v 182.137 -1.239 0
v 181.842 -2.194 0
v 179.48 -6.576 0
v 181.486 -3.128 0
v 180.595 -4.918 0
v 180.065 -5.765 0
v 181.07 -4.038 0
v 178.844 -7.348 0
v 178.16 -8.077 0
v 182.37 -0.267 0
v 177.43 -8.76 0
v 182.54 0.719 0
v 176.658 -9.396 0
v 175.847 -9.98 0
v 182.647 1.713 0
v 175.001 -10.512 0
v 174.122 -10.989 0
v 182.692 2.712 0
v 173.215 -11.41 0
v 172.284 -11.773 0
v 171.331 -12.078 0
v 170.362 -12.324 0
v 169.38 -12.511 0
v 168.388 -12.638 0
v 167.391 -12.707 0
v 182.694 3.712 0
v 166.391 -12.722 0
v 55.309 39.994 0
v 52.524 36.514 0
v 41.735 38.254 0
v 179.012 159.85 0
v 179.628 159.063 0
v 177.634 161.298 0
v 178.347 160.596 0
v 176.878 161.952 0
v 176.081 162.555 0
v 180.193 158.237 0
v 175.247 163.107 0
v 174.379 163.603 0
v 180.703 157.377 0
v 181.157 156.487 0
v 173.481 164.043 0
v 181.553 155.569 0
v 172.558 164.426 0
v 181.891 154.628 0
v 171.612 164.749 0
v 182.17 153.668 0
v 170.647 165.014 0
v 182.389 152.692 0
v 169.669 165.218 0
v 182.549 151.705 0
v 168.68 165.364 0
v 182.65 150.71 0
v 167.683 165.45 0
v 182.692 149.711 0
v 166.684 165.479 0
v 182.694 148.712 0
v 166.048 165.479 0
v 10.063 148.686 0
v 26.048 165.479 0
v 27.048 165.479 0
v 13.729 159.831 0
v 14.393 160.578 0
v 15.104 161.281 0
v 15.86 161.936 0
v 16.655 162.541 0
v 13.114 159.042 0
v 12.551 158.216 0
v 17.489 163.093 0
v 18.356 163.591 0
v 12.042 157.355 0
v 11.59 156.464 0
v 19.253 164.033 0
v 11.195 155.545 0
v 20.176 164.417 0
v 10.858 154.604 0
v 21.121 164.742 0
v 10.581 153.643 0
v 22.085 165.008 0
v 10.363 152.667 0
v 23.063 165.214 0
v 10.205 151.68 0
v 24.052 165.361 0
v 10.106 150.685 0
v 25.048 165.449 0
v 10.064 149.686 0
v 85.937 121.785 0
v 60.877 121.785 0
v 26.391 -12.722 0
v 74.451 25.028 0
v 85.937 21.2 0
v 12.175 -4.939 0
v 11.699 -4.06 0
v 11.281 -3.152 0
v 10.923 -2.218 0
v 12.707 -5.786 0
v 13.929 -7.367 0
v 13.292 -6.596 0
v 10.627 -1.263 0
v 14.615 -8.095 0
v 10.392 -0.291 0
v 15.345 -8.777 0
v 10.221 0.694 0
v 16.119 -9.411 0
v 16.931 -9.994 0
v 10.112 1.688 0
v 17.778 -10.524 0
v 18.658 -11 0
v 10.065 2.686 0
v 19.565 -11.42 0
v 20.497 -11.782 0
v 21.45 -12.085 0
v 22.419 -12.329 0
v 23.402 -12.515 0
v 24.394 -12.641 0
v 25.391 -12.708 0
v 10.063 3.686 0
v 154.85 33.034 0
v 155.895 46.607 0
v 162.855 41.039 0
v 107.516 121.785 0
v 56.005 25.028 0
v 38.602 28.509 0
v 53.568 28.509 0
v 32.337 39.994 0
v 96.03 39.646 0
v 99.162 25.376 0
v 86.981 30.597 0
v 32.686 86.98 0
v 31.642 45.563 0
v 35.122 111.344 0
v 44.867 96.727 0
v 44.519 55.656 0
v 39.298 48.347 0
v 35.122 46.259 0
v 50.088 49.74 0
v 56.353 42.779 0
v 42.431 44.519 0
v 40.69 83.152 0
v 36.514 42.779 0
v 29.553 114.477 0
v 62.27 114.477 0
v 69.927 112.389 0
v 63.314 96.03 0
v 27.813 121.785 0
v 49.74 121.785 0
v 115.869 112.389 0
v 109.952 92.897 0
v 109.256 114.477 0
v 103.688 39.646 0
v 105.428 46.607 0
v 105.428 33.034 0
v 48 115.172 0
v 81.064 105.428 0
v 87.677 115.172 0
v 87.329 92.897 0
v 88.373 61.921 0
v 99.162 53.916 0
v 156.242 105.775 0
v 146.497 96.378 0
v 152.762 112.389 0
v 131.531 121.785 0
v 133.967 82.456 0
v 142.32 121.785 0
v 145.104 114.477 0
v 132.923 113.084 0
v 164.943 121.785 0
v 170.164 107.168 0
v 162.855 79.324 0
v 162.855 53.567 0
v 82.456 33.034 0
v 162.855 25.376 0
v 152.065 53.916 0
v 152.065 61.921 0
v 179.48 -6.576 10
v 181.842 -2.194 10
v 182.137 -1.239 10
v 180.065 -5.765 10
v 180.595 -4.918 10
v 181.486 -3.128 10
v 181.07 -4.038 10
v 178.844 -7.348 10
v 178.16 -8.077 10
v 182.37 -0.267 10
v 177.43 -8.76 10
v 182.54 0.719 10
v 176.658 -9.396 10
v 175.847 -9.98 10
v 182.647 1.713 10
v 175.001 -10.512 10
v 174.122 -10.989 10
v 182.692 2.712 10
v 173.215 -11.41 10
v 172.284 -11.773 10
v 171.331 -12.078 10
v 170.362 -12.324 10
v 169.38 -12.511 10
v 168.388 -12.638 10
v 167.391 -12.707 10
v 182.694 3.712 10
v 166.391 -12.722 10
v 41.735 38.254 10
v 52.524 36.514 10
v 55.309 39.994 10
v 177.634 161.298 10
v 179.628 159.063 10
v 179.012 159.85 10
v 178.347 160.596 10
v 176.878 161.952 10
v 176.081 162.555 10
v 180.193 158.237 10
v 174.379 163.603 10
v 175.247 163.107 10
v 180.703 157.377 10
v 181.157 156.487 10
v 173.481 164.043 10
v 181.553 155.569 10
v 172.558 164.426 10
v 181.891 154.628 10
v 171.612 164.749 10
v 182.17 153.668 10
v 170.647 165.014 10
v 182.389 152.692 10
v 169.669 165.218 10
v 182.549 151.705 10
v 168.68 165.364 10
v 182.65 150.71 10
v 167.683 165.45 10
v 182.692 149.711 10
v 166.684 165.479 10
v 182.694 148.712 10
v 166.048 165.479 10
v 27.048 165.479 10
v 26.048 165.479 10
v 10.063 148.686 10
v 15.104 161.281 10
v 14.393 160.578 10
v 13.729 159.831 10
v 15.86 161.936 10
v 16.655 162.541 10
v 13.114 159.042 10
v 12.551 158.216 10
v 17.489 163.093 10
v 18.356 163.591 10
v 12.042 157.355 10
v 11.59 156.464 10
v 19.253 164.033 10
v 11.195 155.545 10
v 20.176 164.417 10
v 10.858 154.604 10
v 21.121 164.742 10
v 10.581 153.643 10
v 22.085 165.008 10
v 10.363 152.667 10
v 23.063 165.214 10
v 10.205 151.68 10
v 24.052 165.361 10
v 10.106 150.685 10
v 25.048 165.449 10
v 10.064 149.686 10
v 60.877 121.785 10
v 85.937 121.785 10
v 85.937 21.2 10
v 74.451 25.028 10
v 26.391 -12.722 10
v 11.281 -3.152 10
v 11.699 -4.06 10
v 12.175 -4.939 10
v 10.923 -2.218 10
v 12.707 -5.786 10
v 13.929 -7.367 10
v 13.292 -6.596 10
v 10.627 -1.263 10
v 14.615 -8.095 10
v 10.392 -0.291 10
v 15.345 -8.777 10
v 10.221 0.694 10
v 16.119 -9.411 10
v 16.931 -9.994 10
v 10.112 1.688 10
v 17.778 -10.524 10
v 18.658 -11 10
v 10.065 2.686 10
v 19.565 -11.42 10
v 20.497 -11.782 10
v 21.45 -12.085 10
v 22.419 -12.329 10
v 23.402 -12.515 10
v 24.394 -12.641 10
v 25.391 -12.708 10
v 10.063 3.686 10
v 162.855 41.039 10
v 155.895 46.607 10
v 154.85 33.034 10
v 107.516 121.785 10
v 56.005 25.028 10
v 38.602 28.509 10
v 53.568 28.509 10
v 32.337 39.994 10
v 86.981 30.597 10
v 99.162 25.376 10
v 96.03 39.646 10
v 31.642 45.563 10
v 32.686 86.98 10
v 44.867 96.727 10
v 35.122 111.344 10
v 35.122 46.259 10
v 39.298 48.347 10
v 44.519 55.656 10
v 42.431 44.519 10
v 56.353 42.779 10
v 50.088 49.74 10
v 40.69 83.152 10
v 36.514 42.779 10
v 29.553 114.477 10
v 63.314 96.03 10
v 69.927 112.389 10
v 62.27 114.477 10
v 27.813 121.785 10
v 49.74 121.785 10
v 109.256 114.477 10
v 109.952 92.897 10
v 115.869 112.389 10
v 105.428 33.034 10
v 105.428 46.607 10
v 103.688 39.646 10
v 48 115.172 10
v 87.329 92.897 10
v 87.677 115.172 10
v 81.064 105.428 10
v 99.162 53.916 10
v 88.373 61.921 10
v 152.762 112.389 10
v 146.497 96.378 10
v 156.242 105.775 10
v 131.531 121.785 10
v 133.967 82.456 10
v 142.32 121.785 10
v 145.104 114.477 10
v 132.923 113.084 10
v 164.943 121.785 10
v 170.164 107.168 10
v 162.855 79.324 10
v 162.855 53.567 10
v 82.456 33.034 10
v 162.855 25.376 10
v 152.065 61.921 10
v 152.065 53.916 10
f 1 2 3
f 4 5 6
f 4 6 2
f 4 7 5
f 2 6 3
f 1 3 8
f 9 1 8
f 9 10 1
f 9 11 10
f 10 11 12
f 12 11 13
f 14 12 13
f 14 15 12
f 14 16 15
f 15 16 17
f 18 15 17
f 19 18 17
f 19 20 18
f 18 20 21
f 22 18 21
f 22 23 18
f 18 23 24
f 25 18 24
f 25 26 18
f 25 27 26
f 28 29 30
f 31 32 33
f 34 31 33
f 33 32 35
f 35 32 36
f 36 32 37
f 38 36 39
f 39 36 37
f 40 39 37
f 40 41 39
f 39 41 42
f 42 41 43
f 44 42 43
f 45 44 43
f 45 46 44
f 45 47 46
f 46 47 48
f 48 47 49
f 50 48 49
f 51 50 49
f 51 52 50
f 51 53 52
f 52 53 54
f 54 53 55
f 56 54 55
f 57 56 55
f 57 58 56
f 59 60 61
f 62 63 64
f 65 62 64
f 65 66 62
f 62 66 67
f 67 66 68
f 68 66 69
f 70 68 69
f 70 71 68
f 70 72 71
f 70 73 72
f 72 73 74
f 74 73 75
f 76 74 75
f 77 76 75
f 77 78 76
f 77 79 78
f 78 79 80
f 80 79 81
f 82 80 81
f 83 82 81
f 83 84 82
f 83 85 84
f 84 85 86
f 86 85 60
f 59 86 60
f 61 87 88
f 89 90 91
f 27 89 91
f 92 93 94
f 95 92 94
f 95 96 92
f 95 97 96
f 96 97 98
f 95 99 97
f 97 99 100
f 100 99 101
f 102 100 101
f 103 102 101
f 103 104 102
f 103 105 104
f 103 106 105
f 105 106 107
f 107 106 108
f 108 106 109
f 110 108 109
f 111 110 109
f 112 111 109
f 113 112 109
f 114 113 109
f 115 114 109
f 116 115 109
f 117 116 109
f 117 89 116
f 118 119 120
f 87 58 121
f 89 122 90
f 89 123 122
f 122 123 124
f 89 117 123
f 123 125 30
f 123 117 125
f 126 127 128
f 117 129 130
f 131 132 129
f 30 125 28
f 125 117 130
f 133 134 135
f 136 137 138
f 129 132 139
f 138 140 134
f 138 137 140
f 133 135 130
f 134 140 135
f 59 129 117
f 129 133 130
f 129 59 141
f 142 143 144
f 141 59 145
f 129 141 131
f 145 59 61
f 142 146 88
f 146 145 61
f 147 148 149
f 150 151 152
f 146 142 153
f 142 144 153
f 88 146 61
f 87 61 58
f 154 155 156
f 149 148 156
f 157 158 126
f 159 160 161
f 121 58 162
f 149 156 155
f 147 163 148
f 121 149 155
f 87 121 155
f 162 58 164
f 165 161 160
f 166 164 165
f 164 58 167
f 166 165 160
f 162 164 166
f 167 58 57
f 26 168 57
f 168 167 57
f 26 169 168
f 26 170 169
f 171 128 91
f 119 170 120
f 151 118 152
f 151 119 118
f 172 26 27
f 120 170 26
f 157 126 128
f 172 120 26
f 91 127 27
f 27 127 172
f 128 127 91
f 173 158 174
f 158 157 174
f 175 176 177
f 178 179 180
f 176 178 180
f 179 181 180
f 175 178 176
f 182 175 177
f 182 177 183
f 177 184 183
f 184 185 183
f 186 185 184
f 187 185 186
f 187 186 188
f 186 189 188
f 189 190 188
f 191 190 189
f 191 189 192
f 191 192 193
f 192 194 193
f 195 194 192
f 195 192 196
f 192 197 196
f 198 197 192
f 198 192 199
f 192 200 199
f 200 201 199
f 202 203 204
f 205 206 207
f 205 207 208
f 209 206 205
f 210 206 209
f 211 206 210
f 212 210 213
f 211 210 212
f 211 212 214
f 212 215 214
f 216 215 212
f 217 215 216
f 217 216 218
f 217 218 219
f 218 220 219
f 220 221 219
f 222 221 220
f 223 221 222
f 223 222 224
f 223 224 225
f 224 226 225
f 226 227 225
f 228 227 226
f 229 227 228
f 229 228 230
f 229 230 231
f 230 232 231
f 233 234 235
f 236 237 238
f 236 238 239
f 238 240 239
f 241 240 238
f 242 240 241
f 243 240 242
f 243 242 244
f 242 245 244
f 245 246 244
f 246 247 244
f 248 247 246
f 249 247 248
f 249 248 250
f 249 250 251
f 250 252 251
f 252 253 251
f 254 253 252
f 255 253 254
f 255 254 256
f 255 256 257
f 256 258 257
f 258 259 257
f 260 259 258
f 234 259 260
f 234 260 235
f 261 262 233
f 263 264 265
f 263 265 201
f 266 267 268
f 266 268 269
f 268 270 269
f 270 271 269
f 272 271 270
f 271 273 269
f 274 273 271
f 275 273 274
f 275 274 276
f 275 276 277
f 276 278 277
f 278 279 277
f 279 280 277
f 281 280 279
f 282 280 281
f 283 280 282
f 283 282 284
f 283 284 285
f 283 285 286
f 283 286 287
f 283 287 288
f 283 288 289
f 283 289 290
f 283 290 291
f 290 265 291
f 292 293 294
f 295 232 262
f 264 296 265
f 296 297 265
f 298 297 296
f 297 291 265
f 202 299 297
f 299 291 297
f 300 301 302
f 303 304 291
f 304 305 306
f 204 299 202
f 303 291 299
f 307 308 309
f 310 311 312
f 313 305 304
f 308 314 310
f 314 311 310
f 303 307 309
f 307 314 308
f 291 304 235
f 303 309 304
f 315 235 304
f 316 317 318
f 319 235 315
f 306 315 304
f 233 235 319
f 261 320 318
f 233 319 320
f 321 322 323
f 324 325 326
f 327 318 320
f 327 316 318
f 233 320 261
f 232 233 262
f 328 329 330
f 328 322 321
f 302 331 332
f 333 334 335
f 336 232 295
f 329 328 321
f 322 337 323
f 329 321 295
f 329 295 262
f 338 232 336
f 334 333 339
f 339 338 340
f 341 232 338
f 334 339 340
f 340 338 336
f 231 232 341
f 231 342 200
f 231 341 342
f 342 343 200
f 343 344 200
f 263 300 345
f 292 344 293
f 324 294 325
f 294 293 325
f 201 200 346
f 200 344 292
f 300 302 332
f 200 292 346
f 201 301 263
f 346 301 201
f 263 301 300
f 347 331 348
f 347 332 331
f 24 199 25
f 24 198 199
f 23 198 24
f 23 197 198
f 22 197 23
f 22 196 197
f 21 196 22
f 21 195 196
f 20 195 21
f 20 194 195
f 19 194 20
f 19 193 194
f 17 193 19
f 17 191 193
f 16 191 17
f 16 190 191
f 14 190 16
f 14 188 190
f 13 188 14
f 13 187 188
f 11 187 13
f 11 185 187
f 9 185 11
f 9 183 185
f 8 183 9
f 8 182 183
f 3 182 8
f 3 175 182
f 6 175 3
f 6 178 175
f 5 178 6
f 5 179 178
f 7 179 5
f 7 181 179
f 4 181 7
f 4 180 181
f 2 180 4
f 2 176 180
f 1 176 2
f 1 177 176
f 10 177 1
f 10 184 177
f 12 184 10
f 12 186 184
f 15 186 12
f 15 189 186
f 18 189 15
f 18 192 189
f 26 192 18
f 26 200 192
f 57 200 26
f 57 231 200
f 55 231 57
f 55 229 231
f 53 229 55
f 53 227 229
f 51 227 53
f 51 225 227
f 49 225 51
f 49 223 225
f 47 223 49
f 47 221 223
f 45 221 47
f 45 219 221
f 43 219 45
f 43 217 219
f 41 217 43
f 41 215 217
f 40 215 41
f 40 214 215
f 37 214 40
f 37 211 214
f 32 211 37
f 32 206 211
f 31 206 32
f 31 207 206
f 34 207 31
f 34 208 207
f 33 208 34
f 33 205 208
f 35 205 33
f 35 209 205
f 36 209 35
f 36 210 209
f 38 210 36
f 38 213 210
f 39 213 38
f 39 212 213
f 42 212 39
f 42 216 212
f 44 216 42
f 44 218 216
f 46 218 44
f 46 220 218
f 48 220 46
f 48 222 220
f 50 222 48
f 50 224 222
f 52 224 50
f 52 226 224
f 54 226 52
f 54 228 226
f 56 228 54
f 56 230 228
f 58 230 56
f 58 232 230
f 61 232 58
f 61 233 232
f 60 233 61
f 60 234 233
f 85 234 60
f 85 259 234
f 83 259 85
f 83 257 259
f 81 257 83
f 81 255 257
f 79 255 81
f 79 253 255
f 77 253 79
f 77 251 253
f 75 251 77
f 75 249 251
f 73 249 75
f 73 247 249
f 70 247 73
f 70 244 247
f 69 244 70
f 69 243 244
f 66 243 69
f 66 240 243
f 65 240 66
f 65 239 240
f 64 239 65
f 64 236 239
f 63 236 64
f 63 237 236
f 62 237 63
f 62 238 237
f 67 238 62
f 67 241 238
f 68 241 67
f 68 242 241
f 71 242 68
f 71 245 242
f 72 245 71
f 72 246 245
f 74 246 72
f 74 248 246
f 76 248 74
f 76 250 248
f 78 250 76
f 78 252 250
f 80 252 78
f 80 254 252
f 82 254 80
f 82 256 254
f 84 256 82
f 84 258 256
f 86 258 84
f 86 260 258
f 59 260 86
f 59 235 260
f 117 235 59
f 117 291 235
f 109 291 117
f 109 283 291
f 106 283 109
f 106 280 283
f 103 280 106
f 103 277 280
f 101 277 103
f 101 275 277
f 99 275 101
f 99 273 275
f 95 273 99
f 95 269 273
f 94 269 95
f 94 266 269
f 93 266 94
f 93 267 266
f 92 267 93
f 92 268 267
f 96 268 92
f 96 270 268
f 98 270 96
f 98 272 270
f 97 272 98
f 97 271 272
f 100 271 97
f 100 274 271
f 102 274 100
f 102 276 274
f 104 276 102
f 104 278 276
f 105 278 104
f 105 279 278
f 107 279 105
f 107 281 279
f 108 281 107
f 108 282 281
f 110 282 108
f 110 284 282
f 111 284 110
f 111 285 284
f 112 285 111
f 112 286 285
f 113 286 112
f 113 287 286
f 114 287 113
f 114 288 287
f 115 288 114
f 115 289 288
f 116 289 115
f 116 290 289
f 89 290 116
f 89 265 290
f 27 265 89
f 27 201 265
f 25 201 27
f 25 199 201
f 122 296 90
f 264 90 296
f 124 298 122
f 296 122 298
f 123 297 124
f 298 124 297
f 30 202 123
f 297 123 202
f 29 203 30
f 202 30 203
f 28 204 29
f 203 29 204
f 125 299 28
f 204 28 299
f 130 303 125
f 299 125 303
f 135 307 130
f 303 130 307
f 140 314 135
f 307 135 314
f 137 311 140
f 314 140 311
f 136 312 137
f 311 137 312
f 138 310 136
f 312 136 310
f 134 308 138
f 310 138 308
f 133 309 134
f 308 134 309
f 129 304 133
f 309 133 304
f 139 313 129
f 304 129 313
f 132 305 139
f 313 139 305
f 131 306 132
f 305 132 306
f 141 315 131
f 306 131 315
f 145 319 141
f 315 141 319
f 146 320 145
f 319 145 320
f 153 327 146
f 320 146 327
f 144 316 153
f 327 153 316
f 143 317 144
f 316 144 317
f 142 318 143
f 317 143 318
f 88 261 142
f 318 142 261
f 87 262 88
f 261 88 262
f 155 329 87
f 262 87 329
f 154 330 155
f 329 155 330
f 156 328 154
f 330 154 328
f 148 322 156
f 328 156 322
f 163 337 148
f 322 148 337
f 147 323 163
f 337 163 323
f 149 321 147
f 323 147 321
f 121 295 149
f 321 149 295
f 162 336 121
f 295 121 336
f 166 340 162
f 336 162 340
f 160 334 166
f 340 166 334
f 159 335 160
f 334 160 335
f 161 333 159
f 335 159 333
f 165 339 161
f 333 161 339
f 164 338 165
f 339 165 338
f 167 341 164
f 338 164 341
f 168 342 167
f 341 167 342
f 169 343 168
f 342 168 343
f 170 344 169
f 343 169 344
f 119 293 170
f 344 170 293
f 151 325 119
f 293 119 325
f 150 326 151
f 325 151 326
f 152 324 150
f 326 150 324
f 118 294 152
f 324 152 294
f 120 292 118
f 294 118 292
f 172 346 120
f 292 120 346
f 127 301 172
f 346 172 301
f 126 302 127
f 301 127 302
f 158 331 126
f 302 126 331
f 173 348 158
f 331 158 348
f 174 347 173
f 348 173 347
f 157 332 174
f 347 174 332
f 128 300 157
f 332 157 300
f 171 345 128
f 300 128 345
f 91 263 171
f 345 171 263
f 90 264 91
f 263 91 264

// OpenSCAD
linear_extrude(height = 10) {
	delhaize_logo();
}



module delhaize_logo() {

difference() {
translate([0,-20,0])
polygon(points=[[166.68399047851562,185.47900390625],[167.68344116210938,185.4501953125],[168.67950439453125,185.36367797851562],[169.66873168945312,185.2183837890625],[170.64736938476562,185.01370239257812],[171.61160278320312,184.7493896484375],[172.55758666992188,184.42568969726562],[173.48135375976562,184.04330444335938],[174.37908935546875,183.60317993164062],[175.2469482421875,183.10675048828125],[176.08099365234375,182.55535888671875],[176.87786865234375,181.95156860351562],[177.63421630859375,181.29769897460938],[178.34686279296875,180.59640502929688],[179.01235961914062,179.85028076171875],[179.62835693359375,179.06277465820312],[180.19253540039062,178.23736572265625],[180.70257568359375,177.37744140625],[181.1566162109375,176.48666381835938],[181.55307006835938,175.56881713867188],[181.89102172851562,174.62783813476562],[182.16976928710938,173.66766357421875],[182.38897705078125,172.69216918945312],[182.54876708984375,171.7052001953125],[182.64962768554688,170.71044921875],[182.69216918945312,169.71148681640625],[182.69400024414062,168.71151733398438],[182.69400024414062,167.71151733398438],[182.69400024414062,166.71151733398438],[182.69400024414062,165.71151733398438],[182.69400024414062,164.71151733398438],[182.69400024414062,163.71151733398438],[182.69400024414062,162.71151733398438],[182.69400024414062,161.71151733398438],[182.69400024414062,160.71151733398438],[182.69400024414062,159.71151733398438],[182.69400024414062,158.71151733398438],[182.69400024414062,157.71151733398438],[182.69400024414062,156.71151733398438],[182.69400024414062,155.71151733398438],[182.69400024414062,154.71151733398438],[182.69400024414062,153.71151733398438],[182.69400024414062,152.71151733398438],[182.69400024414062,151.71151733398438],[182.69400024414062,150.71151733398438],[182.69400024414062,149.71151733398438],[182.69400024414062,148.71151733398438],[182.69400024414062,147.71151733398438],[182.69400024414062,146.71151733398438],[182.69400024414062,145.71151733398438],[182.69400024414062,144.71151733398438],[182.69400024414062,143.71151733398438],[182.69400024414062,142.71151733398438],[182.69400024414062,141.71151733398438],[182.69400024414062,140.71151733398438],[182.69400024414062,139.71151733398438],[182.69400024414062,138.71151733398438],[182.69400024414062,137.71151733398438],[182.69400024414062,136.71151733398438],[182.69400024414062,135.71151733398438],[182.69400024414062,134.71151733398438],[182.69400024414062,133.71151733398438],[182.69400024414062,132.71151733398438],[182.69400024414062,131.71151733398438],[182.69400024414062,130.71151733398438],[182.69400024414062,129.71151733398438],[182.69400024414062,128.71151733398438],[182.69400024414062,127.71151733398438],[182.69400024414062,126.71151733398438],[182.69400024414062,125.71151733398438],[182.69400024414062,124.71151733398438],[182.69400024414062,123.71151733398438],[182.69400024414062,122.71151733398438],[182.69400024414062,121.71151733398438],[182.69400024414062,120.71151733398438],[182.69400024414062,119.71151733398438],[182.69400024414062,118.71151733398438],[182.69400024414062,117.71151733398438],[182.69400024414062,116.71151733398438],[182.69400024414062,115.71151733398438],[182.69400024414062,114.71151733398438],[182.69400024414062,113.71151733398438],[182.69400024414062,112.71151733398438],[182.69400024414062,111.71151733398438],[182.69400024414062,110.71151733398438],[182.69400024414062,109.71151733398438],[182.69400024414062,108.71151733398438],[182.69400024414062,107.71151733398438],[182.69400024414062,106.71151733398438],[182.69400024414062,105.71151733398438],[182.69400024414062,104.71151733398438],[182.69400024414062,103.71151733398438],[182.69400024414062,102.71151733398438],[182.69400024414062,101.71151733398438],[182.69400024414062,100.71151733398438],[182.69400024414062,99.71151733398438],[182.69400024414062,98.71151733398438],[182.69400024414062,97.71151733398438],[182.69400024414062,96.71151733398438],[182.69400024414062,95.71151733398438],[182.69400024414062,94.71151733398438],[182.69400024414062,93.71151733398438],[182.69400024414062,92.71151733398438],[182.69400024414062,91.71151733398438],[182.69400024414062,90.71151733398438],[182.69400024414062,89.71151733398438],[182.69400024414062,88.71151733398438],[182.69400024414062,87.71151733398438],[182.69400024414062,86.71151733398438],[182.69400024414062,85.71151733398438],[182.69400024414062,84.71151733398438],[182.69400024414062,83.71151733398438],[182.69400024414062,82.71151733398438],[182.69400024414062,81.71151733398438],[182.69400024414062,80.71151733398438],[182.69400024414062,79.71151733398438],[182.69400024414062,78.71151733398438],[182.69400024414062,77.71151733398438],[182.69400024414062,76.71151733398438],[182.69400024414062,75.71151733398438],[182.69400024414062,74.71151733398438],[182.69400024414062,73.71151733398438],[182.69400024414062,72.71151733398438],[182.69400024414062,71.71151733398438],[182.69400024414062,70.71151733398438],[182.69400024414062,69.71151733398438],[182.69400024414062,68.71151733398438],[182.69400024414062,67.71151733398438],[182.69400024414062,66.71151733398438],[182.69400024414062,65.71151733398438],[182.69400024414062,64.71151733398438],[182.69400024414062,63.711517333984375],[182.69400024414062,62.711517333984375],[182.69400024414062,61.711517333984375],[182.69400024414062,60.711517333984375],[182.69400024414062,59.711517333984375],[182.69400024414062,58.711517333984375],[182.69400024414062,57.711517333984375],[182.69400024414062,56.711517333984375],[182.69400024414062,55.711517333984375],[182.69400024414062,54.711517333984375],[182.69400024414062,53.711517333984375],[182.69400024414062,52.711517333984375],[182.69400024414062,51.711517333984375],[182.69400024414062,50.711517333984375],[182.69400024414062,49.711517333984375],[182.69400024414062,48.711517333984375],[182.69400024414062,47.711517333984375],[182.69400024414062,46.711517333984375],[182.69400024414062,45.711517333984375],[182.69400024414062,44.711517333984375],[182.69400024414062,43.711517333984375],[182.69400024414062,42.711517333984375],[182.69400024414062,41.711517333984375],[182.69400024414062,40.711517333984375],[182.69400024414062,39.711517333984375],[182.69400024414062,38.711517333984375],[182.69400024414062,37.711517333984375],[182.69400024414062,36.711517333984375],[182.69400024414062,35.711517333984375],[182.69400024414062,34.711517333984375],[182.69400024414062,33.711517333984375],[182.69400024414062,32.711517333984375],[182.69400024414062,31.711517333984375],[182.69400024414062,30.711517333984375],[182.69400024414062,29.711517333984375],[182.69400024414062,28.711517333984375],[182.69400024414062,27.711517333984375],[182.69400024414062,26.711517333984375],[182.69400024414062,25.711517333984375],[182.69400024414062,24.711517333984375],[182.69400024414062,23.711517333984375],[182.69229125976562,22.711517333984375],[182.6473388671875,21.71270751953125],[182.54000854492188,20.718658447265625],[182.36981201171875,19.73345947265625],[182.136962890625,18.761138916015625],[181.84188842773438,17.805877685546875],[181.48568725585938,16.871673583984375],[181.0697021484375,15.962493896484375],[180.59515380859375,15.082489013671875],[180.06451416015625,14.235137939453125],[179.48013305664062,13.42388916015625],[178.84445190429688,12.652191162109375],[178.16012573242188,11.92327880859375],[177.430419921875,11.23980712890625],[176.658447265625,10.60443115234375],[175.84722900390625,10.02001953125],[175.00054931640625,9.488250732421875],[174.1219482421875,9.011138916015625],[173.21505737304688,8.5902099609375],[172.28359985351562,8.226837158203125],[171.33139038085938,7.921875],[170.36227416992188,7.675994873046875],[169.3800048828125,7.48931884765625],[168.38833618164062,7.36175537109375],[167.39089965820312,7.292572021484375],[166.39111328125,7.27801513671875],[165.39111328125,7.27801513671875],[164.39111328125,7.27801513671875],[163.39111328125,7.27801513671875],[162.39111328125,7.27801513671875],[161.39111328125,7.27801513671875],[160.39111328125,7.27801513671875],[159.39111328125,7.27801513671875],[158.39111328125,7.27801513671875],[157.39111328125,7.27801513671875],[156.39111328125,7.27801513671875],[155.39111328125,7.27801513671875],[154.39111328125,7.27801513671875],[153.39111328125,7.27801513671875],[152.39111328125,7.27801513671875],[151.39111328125,7.27801513671875],[150.39111328125,7.27801513671875],[149.39111328125,7.27801513671875],[148.39111328125,7.27801513671875],[147.39111328125,7.27801513671875],[146.39111328125,7.27801513671875],[145.39111328125,7.27801513671875],[144.39111328125,7.27801513671875],[143.39111328125,7.27801513671875],[142.39111328125,7.27801513671875],[141.39111328125,7.27801513671875],[140.39111328125,7.27801513671875],[139.39111328125,7.27801513671875],[138.39111328125,7.27801513671875],[137.39111328125,7.27801513671875],[136.39111328125,7.27801513671875],[135.39111328125,7.27801513671875],[134.39111328125,7.27801513671875],[133.39111328125,7.27801513671875],[132.39111328125,7.27801513671875],[131.39111328125,7.27801513671875],[130.39111328125,7.27801513671875],[129.39111328125,7.27801513671875],[128.39111328125,7.27801513671875],[127.39111328125,7.27801513671875],[126.39111328125,7.27801513671875],[125.39111328125,7.27801513671875],[124.39111328125,7.27801513671875],[123.39111328125,7.27801513671875],[122.39111328125,7.27801513671875],[121.39111328125,7.27801513671875],[120.39111328125,7.27801513671875],[119.39111328125,7.27801513671875],[118.39111328125,7.27801513671875],[117.39111328125,7.27801513671875],[116.39111328125,7.27801513671875],[115.39111328125,7.27801513671875],[114.39111328125,7.27801513671875],[113.39111328125,7.27801513671875],[112.39111328125,7.27801513671875],[111.39111328125,7.27801513671875],[110.39111328125,7.27801513671875],[109.39111328125,7.27801513671875],[108.39111328125,7.27801513671875],[107.39111328125,7.27801513671875],[106.39111328125,7.27801513671875],[105.39111328125,7.27801513671875],[104.39111328125,7.27801513671875],[103.39111328125,7.27801513671875],[102.39111328125,7.27801513671875],[101.39111328125,7.27801513671875],[100.39111328125,7.27801513671875],[99.39111328125,7.27801513671875],[98.39111328125,7.27801513671875],[97.39111328125,7.27801513671875],[96.39111328125,7.27801513671875],[95.39111328125,7.27801513671875],[94.39111328125,7.27801513671875],[93.39111328125,7.27801513671875],[92.39111328125,7.27801513671875],[91.39111328125,7.27801513671875],[90.39111328125,7.27801513671875],[89.39111328125,7.27801513671875],[88.39111328125,7.27801513671875],[87.39111328125,7.27801513671875],[86.39111328125,7.27801513671875],[85.39111328125,7.27801513671875],[84.39111328125,7.27801513671875],[83.39111328125,7.27801513671875],[82.39111328125,7.27801513671875],[81.39111328125,7.27801513671875],[80.39111328125,7.27801513671875],[79.39111328125,7.27801513671875],[78.39111328125,7.27801513671875],[77.39111328125,7.27801513671875],[76.39111328125,7.27801513671875],[75.39111328125,7.27801513671875],[74.39111328125,7.27801513671875],[73.39111328125,7.27801513671875],[72.39111328125,7.27801513671875],[71.39111328125,7.27801513671875],[70.39111328125,7.27801513671875],[69.39111328125,7.27801513671875],[68.39111328125,7.27801513671875],[67.39111328125,7.27801513671875],[66.39111328125,7.27801513671875],[65.39111328125,7.27801513671875],[64.39111328125,7.27801513671875],[63.39111328125,7.27801513671875],[62.39111328125,7.27801513671875],[61.39111328125,7.27801513671875],[60.39111328125,7.27801513671875],[59.39111328125,7.27801513671875],[58.39111328125,7.27801513671875],[57.39111328125,7.27801513671875],[56.39111328125,7.27801513671875],[55.39111328125,7.27801513671875],[54.39111328125,7.27801513671875],[53.39111328125,7.27801513671875],[52.39111328125,7.27801513671875],[51.39111328125,7.27801513671875],[50.39111328125,7.27801513671875],[49.39111328125,7.27801513671875],[48.39111328125,7.27801513671875],[47.39111328125,7.27801513671875],[46.39111328125,7.27801513671875],[45.39111328125,7.27801513671875],[44.39111328125,7.27801513671875],[43.39111328125,7.27801513671875],[42.39111328125,7.27801513671875],[41.39111328125,7.27801513671875],[40.39111328125,7.27801513671875],[39.39111328125,7.27801513671875],[38.39111328125,7.27801513671875],[37.39111328125,7.27801513671875],[36.39111328125,7.27801513671875],[35.39111328125,7.27801513671875],[34.39111328125,7.27801513671875],[33.39111328125,7.27801513671875],[32.39111328125,7.27801513671875],[31.39111328125,7.27801513671875],[30.39111328125,7.27801513671875],[29.39111328125,7.27801513671875],[28.39111328125,7.27801513671875],[27.39111328125,7.27801513671875],[26.39111328125,7.27801513671875],[25.391311645507812,7.29150390625],[24.393753051757812,7.359161376953125],[23.401901245117188,7.48541259765625],[22.41937255859375,7.670684814453125],[21.44989013671875,7.915069580078125],[20.497177124023438,8.218414306640625],[19.565093994140625,8.580230712890625],[18.657577514648438,8.999755859375],[17.778213500976562,9.47552490234375],[16.930694580078125,10.005950927734375],[16.118576049804688,10.589111328125],[15.345474243164062,11.223114013671875],[14.61474609375,11.90545654296875],[13.929275512695312,12.633331298828125],[13.292144775390625,13.403839111328125],[12.706558227539062,14.214202880859375],[12.174591064453125,15.06072998046875],[11.6986083984375,15.939971923828125],[11.280990600585938,16.848358154296875],[10.923324584960938,17.78204345703125],[10.62677001953125,18.73681640625],[10.392364501953125,19.708770751953125],[10.220626831054688,20.693695068359375],[10.1116943359375,21.68756103515625],[10.065216064453125,22.686309814453125],[10.063003540039062,23.686279296875],[10.063003540039062,24.686279296875],[10.063003540039062,25.686279296875],[10.063003540039062,26.686279296875],[10.063003540039062,27.686279296875],[10.063003540039062,28.686279296875],[10.063003540039062,29.686279296875],[10.063003540039062,30.686279296875],[10.063003540039062,31.686279296875],[10.063003540039062,32.686279296875],[10.063003540039062,33.686279296875],[10.063003540039062,34.686279296875],[10.063003540039062,35.686279296875],[10.063003540039062,36.686279296875],[10.063003540039062,37.686279296875],[10.063003540039062,38.686279296875],[10.063003540039062,39.686279296875],[10.063003540039062,40.686279296875],[10.063003540039062,41.686279296875],[10.063003540039062,42.686279296875],[10.063003540039062,43.686279296875],[10.063003540039062,44.686279296875],[10.063003540039062,45.686279296875],[10.063003540039062,46.686279296875],[10.063003540039062,47.686279296875],[10.063003540039062,48.686279296875],[10.063003540039062,49.686279296875],[10.063003540039062,50.686279296875],[10.063003540039062,51.686279296875],[10.063003540039062,52.686279296875],[10.063003540039062,53.686279296875],[10.063003540039062,54.686279296875],[10.063003540039062,55.686279296875],[10.063003540039062,56.686279296875],[10.063003540039062,57.686279296875],[10.063003540039062,58.686279296875],[10.063003540039062,59.686279296875],[10.063003540039062,60.686279296875],[10.063003540039062,61.686279296875],[10.063003540039062,62.686279296875],[10.063003540039062,63.686279296875],[10.063003540039062,64.686279296875],[10.063003540039062,65.686279296875],[10.063003540039062,66.686279296875],[10.063003540039062,67.686279296875],[10.063003540039062,68.686279296875],[10.063003540039062,69.686279296875],[10.063003540039062,70.686279296875],[10.063003540039062,71.686279296875],[10.063003540039062,72.686279296875],[10.063003540039062,73.686279296875],[10.063003540039062,74.686279296875],[10.063003540039062,75.686279296875],[10.063003540039062,76.686279296875],[10.063003540039062,77.686279296875],[10.063003540039062,78.686279296875],[10.063003540039062,79.686279296875],[10.063003540039062,80.686279296875],[10.063003540039062,81.686279296875],[10.063003540039062,82.686279296875],[10.063003540039062,83.686279296875],[10.063003540039062,84.686279296875],[10.063003540039062,85.686279296875],[10.063003540039062,86.686279296875],[10.063003540039062,87.686279296875],[10.063003540039062,88.686279296875],[10.063003540039062,89.686279296875],[10.063003540039062,90.686279296875],[10.063003540039062,91.686279296875],[10.063003540039062,92.686279296875],[10.063003540039062,93.686279296875],[10.063003540039062,94.686279296875],[10.063003540039062,95.686279296875],[10.063003540039062,96.686279296875],[10.063003540039062,97.686279296875],[10.063003540039062,98.686279296875],[10.063003540039062,99.686279296875],[10.063003540039062,100.686279296875],[10.063003540039062,101.686279296875],[10.063003540039062,102.686279296875],[10.063003540039062,103.686279296875],[10.063003540039062,104.686279296875],[10.063003540039062,105.686279296875],[10.063003540039062,106.686279296875],[10.063003540039062,107.686279296875],[10.063003540039062,108.686279296875],[10.063003540039062,109.686279296875],[10.063003540039062,110.686279296875],[10.063003540039062,111.686279296875],[10.063003540039062,112.686279296875],[10.063003540039062,113.686279296875],[10.063003540039062,114.686279296875],[10.063003540039062,115.686279296875],[10.063003540039062,116.686279296875],[10.063003540039062,117.686279296875],[10.063003540039062,118.686279296875],[10.063003540039062,119.686279296875],[10.063003540039062,120.686279296875],[10.063003540039062,121.686279296875],[10.063003540039062,122.686279296875],[10.063003540039062,123.686279296875],[10.063003540039062,124.686279296875],[10.063003540039062,125.686279296875],[10.063003540039062,126.686279296875],[10.063003540039062,127.686279296875],[10.063003540039062,128.686279296875],[10.063003540039062,129.686279296875],[10.063003540039062,130.686279296875],[10.063003540039062,131.686279296875],[10.063003540039062,132.686279296875],[10.063003540039062,133.686279296875],[10.063003540039062,134.686279296875],[10.063003540039062,135.686279296875],[10.063003540039062,136.686279296875],[10.063003540039062,137.686279296875],[10.063003540039062,138.686279296875],[10.063003540039062,139.686279296875],[10.063003540039062,140.686279296875],[10.063003540039062,141.686279296875],[10.063003540039062,142.686279296875],[10.063003540039062,143.686279296875],[10.063003540039062,144.686279296875],[10.063003540039062,145.686279296875],[10.063003540039062,146.686279296875],[10.063003540039062,147.686279296875],[10.063003540039062,148.686279296875],[10.063003540039062,149.686279296875],[10.063003540039062,150.686279296875],[10.063003540039062,151.686279296875],[10.063003540039062,152.686279296875],[10.063003540039062,153.686279296875],[10.063003540039062,154.686279296875],[10.063003540039062,155.686279296875],[10.063003540039062,156.686279296875],[10.063003540039062,157.686279296875],[10.063003540039062,158.686279296875],[10.063003540039062,159.686279296875],[10.063003540039062,160.686279296875],[10.063003540039062,161.686279296875],[10.063003540039062,162.686279296875],[10.063003540039062,163.686279296875],[10.063003540039062,164.686279296875],[10.063003540039062,165.686279296875],[10.063003540039062,166.686279296875],[10.063003540039062,167.686279296875],[10.063003540039062,168.686279296875],[10.064407348632812,169.686279296875],[10.105697631835938,170.68527221679688],[10.205047607421875,171.68014526367188],[10.363311767578125,172.6673583984375],[10.58099365234375,173.6431884765625],[10.858245849609375,174.60379028320312],[11.19476318359375,175.5452880859375],[11.589767456054688,176.46380615234375],[12.042190551757812,177.3553466796875],[12.550888061523438,178.21609497070312],[13.113739013671875,179.04241943359375],[13.728546142578125,179.83084106445312],[14.392868041992188,180.57806396484375],[15.104202270507812,181.2806396484375],[15.859512329101562,181.93569946289062],[16.65545654296875,182.54074096679688],[17.488632202148438,183.0933837890625],[18.3555908203125,183.5914306640625],[19.252670288085938,184.03292846679688],[20.175827026367188,184.416748046875],[21.121322631835938,184.74191284179688],[22.085159301757812,185.00775146484375],[23.063461303710938,185.21392822265625],[24.052459716796875,185.36074829101562],[25.048431396484375,185.44882202148438],[26.04779052734375,185.47882080078125],[27.047760009765625,185.47897338867188],[28.047760009765625,185.47897338867188],[29.047760009765625,185.47897338867188],[30.047760009765625,185.47897338867188],[31.047760009765625,185.47897338867188],[32.047760009765625,185.47897338867188],[33.047760009765625,185.47897338867188],[34.047760009765625,185.47897338867188],[35.047760009765625,185.47897338867188],[36.047760009765625,185.47897338867188],[37.047760009765625,185.47897338867188],[38.047760009765625,185.47897338867188],[39.047760009765625,185.47897338867188],[40.047760009765625,185.47897338867188],[41.047760009765625,185.47897338867188],[42.047760009765625,185.47897338867188],[43.047760009765625,185.47897338867188],[44.047760009765625,185.47897338867188],[45.047760009765625,185.47897338867188],[46.047760009765625,185.47897338867188],[47.047760009765625,185.47897338867188],[48.047760009765625,185.47897338867188],[49.047760009765625,185.47897338867188],[50.047760009765625,185.47897338867188],[51.047760009765625,185.47897338867188],[52.047760009765625,185.47897338867188],[53.047760009765625,185.47897338867188],[54.047760009765625,185.47897338867188],[55.047760009765625,185.47897338867188],[56.047760009765625,185.47897338867188],[57.047760009765625,185.47897338867188],[58.047760009765625,185.47897338867188],[59.047760009765625,185.47897338867188],[60.047760009765625,185.47897338867188],[61.047760009765625,185.47897338867188],[62.047760009765625,185.47897338867188],[63.047760009765625,185.47897338867188],[64.04776000976562,185.47897338867188],[65.04776000976562,185.47897338867188],[66.04776000976562,185.47897338867188],[67.04776000976562,185.47897338867188],[68.04776000976562,185.47897338867188],[69.04776000976562,185.47897338867188],[70.04776000976562,185.47897338867188],[71.04776000976562,185.47897338867188],[72.04776000976562,185.47897338867188],[73.04776000976562,185.47897338867188],[74.04776000976562,185.47897338867188],[75.04776000976562,185.47897338867188],[76.04776000976562,185.47897338867188],[77.04776000976562,185.47897338867188],[78.04776000976562,185.47897338867188],[79.04776000976562,185.47897338867188],[80.04776000976562,185.47897338867188],[81.04776000976562,185.47897338867188],[82.04776000976562,185.47897338867188],[83.04776000976562,185.47897338867188],[84.04776000976562,185.47897338867188],[85.04776000976562,185.47897338867188],[86.04776000976562,185.47897338867188],[87.04776000976562,185.47897338867188],[88.04776000976562,185.47897338867188],[89.04776000976562,185.47897338867188],[90.04776000976562,185.47897338867188],[91.04776000976562,185.47897338867188],[92.04776000976562,185.47897338867188],[93.04776000976562,185.47897338867188],[94.04776000976562,185.47897338867188],[95.04776000976562,185.47897338867188],[96.04776000976562,185.47897338867188],[97.04776000976562,185.47897338867188],[98.04776000976562,185.47897338867188],[99.04776000976562,185.47897338867188],[100.04776000976562,185.47897338867188],[101.04776000976562,185.47897338867188],[102.04776000976562,185.47897338867188],[103.04776000976562,185.47897338867188],[104.04776000976562,185.47897338867188],[105.04776000976562,185.47897338867188],[106.04776000976562,185.47897338867188],[107.04776000976562,185.47897338867188],[108.04776000976562,185.47897338867188],[109.04776000976562,185.47897338867188],[110.04776000976562,185.47897338867188],[111.04776000976562,185.47897338867188],[112.04776000976562,185.47897338867188],[113.04776000976562,185.47897338867188],[114.04776000976562,185.47897338867188],[115.04776000976562,185.47897338867188],[116.04776000976562,185.47897338867188],[117.04776000976562,185.47897338867188],[118.04776000976562,185.47897338867188],[119.04776000976562,185.47897338867188],[120.04776000976562,185.47897338867188],[121.04776000976562,185.47897338867188],[122.04776000976562,185.47897338867188],[123.04776000976562,185.47897338867188],[124.04776000976562,185.47897338867188],[125.04776000976562,185.47897338867188],[126.04776000976562,185.47897338867188],[127.04776000976562,185.47897338867188],[128.04776000976562,185.47897338867188],[129.04776000976562,185.47897338867188],[130.04776000976562,185.47897338867188],[131.04776000976562,185.47897338867188],[132.04776000976562,185.47897338867188],[133.04776000976562,185.47897338867188],[134.04776000976562,185.47897338867188],[135.04776000976562,185.47897338867188],[136.04776000976562,185.47897338867188],[137.04776000976562,185.47897338867188],[138.04776000976562,185.47897338867188],[139.04776000976562,185.47897338867188],[140.04776000976562,185.47897338867188],[141.04776000976562,185.47897338867188],[142.04776000976562,185.47897338867188],[143.04776000976562,185.47897338867188],[144.04776000976562,185.47897338867188],[145.04776000976562,185.47897338867188],[146.04776000976562,185.47897338867188],[147.04776000976562,185.47897338867188],[148.04776000976562,185.47897338867188],[149.04776000976562,185.47897338867188],[150.04776000976562,185.47897338867188],[151.04776000976562,185.47897338867188],[152.04776000976562,185.47897338867188],[153.04776000976562,185.47897338867188],[154.04776000976562,185.47897338867188],[155.04776000976562,185.47897338867188],[156.04776000976562,185.47897338867188],[157.04776000976562,185.47897338867188],[158.04776000976562,185.47897338867188],[159.04776000976562,185.47897338867188],[160.04776000976562,185.47897338867188],[161.04776000976562,185.47897338867188],[162.04776000976562,185.47897338867188],[163.04776000976562,185.47897338867188],[164.04776000976562,185.47897338867188],[165.04776000976562,185.47897338867188],[166.04776000976562,185.47897338867188]]);


polygon(points=[[38.60200500488281,28.509002685546875],[53.5679931640625,28.509002685546875],[56.0050048828125,25.02801513671875],[74.45098876953125,25.02801513671875],[85.93701171875,21.20001220703125],[82.45599365234375,33.03399658203125],[86.98098754882812,30.59698486328125],[88.37298583984375,61.920989990234375],[152.06500244140625,61.920989990234375],[152.06500244140625,53.915985107421875],[99.1619873046875,53.915985107421875],[96.02999877929688,39.64599609375],[99.1619873046875,25.376007080078125],[162.85501098632812,25.376007080078125],[162.85501098632812,41.03900146484375],[154.85000610351562,33.03399658203125],[105.42800903320312,33.03399658203125],[103.68798828125,39.64599609375],[105.42800903320312,46.60699462890625],[155.89498901367188,46.60699462890625],[162.85501098632812,53.566986083984375],[162.85501098632812,79.32400512695312],[170.16400146484375,107.16799926757812],[164.9429931640625,121.78500366210938],[142.32000732421875,121.78500366210938],[145.10400390625,114.47698974609375],[152.76199340820312,112.38900756835938],[156.24200439453125,105.77499389648438],[146.49700927734375,96.37799072265625],[132.92300415039062,113.08401489257812],[131.531005859375,121.78500366210938],[107.5159912109375,121.78500366210938],[109.25601196289062,114.47698974609375],[115.86898803710938,112.38900756835938],[133.96701049804688,82.45599365234375],[109.95199584960938,92.89700317382812],[87.32901000976562,92.89700317382812],[81.06399536132812,105.42800903320312],[87.677001953125,115.1719970703125],[85.93701171875,121.78500366210938],[60.87701416015625,121.78500366210938],[62.269989013671875,114.47698974609375],[69.927001953125,112.38900756835938],[63.313995361328125,96.02999877929688],[48,115.1719970703125],[49.739990234375,121.78500366210938],[27.813003540039062,121.78500366210938],[29.552993774414062,114.47698974609375],[35.12199401855469,111.343994140625],[44.86700439453125,96.72698974609375],[40.69000244140625,83.15200805664062],[32.686004638671875,86.98001098632812],[44.51899719238281,55.656005859375],[39.298004150390625,48.34698486328125],[42.430999755859375,44.519012451171875],[50.0880126953125,49.739990234375],[56.352996826171875,42.77899169921875],[36.514007568359375,42.77899169921875],[35.12199401855469,46.259002685546875],[31.641998291015625,45.56298828125],[32.337005615234375,39.993988037109375],[55.308990478515625,39.993988037109375],[52.52398681640625,36.514007568359375],[41.73500061035156,38.253997802734375],[38.60200500488281,28.509002685546875]]);	

}


		}
